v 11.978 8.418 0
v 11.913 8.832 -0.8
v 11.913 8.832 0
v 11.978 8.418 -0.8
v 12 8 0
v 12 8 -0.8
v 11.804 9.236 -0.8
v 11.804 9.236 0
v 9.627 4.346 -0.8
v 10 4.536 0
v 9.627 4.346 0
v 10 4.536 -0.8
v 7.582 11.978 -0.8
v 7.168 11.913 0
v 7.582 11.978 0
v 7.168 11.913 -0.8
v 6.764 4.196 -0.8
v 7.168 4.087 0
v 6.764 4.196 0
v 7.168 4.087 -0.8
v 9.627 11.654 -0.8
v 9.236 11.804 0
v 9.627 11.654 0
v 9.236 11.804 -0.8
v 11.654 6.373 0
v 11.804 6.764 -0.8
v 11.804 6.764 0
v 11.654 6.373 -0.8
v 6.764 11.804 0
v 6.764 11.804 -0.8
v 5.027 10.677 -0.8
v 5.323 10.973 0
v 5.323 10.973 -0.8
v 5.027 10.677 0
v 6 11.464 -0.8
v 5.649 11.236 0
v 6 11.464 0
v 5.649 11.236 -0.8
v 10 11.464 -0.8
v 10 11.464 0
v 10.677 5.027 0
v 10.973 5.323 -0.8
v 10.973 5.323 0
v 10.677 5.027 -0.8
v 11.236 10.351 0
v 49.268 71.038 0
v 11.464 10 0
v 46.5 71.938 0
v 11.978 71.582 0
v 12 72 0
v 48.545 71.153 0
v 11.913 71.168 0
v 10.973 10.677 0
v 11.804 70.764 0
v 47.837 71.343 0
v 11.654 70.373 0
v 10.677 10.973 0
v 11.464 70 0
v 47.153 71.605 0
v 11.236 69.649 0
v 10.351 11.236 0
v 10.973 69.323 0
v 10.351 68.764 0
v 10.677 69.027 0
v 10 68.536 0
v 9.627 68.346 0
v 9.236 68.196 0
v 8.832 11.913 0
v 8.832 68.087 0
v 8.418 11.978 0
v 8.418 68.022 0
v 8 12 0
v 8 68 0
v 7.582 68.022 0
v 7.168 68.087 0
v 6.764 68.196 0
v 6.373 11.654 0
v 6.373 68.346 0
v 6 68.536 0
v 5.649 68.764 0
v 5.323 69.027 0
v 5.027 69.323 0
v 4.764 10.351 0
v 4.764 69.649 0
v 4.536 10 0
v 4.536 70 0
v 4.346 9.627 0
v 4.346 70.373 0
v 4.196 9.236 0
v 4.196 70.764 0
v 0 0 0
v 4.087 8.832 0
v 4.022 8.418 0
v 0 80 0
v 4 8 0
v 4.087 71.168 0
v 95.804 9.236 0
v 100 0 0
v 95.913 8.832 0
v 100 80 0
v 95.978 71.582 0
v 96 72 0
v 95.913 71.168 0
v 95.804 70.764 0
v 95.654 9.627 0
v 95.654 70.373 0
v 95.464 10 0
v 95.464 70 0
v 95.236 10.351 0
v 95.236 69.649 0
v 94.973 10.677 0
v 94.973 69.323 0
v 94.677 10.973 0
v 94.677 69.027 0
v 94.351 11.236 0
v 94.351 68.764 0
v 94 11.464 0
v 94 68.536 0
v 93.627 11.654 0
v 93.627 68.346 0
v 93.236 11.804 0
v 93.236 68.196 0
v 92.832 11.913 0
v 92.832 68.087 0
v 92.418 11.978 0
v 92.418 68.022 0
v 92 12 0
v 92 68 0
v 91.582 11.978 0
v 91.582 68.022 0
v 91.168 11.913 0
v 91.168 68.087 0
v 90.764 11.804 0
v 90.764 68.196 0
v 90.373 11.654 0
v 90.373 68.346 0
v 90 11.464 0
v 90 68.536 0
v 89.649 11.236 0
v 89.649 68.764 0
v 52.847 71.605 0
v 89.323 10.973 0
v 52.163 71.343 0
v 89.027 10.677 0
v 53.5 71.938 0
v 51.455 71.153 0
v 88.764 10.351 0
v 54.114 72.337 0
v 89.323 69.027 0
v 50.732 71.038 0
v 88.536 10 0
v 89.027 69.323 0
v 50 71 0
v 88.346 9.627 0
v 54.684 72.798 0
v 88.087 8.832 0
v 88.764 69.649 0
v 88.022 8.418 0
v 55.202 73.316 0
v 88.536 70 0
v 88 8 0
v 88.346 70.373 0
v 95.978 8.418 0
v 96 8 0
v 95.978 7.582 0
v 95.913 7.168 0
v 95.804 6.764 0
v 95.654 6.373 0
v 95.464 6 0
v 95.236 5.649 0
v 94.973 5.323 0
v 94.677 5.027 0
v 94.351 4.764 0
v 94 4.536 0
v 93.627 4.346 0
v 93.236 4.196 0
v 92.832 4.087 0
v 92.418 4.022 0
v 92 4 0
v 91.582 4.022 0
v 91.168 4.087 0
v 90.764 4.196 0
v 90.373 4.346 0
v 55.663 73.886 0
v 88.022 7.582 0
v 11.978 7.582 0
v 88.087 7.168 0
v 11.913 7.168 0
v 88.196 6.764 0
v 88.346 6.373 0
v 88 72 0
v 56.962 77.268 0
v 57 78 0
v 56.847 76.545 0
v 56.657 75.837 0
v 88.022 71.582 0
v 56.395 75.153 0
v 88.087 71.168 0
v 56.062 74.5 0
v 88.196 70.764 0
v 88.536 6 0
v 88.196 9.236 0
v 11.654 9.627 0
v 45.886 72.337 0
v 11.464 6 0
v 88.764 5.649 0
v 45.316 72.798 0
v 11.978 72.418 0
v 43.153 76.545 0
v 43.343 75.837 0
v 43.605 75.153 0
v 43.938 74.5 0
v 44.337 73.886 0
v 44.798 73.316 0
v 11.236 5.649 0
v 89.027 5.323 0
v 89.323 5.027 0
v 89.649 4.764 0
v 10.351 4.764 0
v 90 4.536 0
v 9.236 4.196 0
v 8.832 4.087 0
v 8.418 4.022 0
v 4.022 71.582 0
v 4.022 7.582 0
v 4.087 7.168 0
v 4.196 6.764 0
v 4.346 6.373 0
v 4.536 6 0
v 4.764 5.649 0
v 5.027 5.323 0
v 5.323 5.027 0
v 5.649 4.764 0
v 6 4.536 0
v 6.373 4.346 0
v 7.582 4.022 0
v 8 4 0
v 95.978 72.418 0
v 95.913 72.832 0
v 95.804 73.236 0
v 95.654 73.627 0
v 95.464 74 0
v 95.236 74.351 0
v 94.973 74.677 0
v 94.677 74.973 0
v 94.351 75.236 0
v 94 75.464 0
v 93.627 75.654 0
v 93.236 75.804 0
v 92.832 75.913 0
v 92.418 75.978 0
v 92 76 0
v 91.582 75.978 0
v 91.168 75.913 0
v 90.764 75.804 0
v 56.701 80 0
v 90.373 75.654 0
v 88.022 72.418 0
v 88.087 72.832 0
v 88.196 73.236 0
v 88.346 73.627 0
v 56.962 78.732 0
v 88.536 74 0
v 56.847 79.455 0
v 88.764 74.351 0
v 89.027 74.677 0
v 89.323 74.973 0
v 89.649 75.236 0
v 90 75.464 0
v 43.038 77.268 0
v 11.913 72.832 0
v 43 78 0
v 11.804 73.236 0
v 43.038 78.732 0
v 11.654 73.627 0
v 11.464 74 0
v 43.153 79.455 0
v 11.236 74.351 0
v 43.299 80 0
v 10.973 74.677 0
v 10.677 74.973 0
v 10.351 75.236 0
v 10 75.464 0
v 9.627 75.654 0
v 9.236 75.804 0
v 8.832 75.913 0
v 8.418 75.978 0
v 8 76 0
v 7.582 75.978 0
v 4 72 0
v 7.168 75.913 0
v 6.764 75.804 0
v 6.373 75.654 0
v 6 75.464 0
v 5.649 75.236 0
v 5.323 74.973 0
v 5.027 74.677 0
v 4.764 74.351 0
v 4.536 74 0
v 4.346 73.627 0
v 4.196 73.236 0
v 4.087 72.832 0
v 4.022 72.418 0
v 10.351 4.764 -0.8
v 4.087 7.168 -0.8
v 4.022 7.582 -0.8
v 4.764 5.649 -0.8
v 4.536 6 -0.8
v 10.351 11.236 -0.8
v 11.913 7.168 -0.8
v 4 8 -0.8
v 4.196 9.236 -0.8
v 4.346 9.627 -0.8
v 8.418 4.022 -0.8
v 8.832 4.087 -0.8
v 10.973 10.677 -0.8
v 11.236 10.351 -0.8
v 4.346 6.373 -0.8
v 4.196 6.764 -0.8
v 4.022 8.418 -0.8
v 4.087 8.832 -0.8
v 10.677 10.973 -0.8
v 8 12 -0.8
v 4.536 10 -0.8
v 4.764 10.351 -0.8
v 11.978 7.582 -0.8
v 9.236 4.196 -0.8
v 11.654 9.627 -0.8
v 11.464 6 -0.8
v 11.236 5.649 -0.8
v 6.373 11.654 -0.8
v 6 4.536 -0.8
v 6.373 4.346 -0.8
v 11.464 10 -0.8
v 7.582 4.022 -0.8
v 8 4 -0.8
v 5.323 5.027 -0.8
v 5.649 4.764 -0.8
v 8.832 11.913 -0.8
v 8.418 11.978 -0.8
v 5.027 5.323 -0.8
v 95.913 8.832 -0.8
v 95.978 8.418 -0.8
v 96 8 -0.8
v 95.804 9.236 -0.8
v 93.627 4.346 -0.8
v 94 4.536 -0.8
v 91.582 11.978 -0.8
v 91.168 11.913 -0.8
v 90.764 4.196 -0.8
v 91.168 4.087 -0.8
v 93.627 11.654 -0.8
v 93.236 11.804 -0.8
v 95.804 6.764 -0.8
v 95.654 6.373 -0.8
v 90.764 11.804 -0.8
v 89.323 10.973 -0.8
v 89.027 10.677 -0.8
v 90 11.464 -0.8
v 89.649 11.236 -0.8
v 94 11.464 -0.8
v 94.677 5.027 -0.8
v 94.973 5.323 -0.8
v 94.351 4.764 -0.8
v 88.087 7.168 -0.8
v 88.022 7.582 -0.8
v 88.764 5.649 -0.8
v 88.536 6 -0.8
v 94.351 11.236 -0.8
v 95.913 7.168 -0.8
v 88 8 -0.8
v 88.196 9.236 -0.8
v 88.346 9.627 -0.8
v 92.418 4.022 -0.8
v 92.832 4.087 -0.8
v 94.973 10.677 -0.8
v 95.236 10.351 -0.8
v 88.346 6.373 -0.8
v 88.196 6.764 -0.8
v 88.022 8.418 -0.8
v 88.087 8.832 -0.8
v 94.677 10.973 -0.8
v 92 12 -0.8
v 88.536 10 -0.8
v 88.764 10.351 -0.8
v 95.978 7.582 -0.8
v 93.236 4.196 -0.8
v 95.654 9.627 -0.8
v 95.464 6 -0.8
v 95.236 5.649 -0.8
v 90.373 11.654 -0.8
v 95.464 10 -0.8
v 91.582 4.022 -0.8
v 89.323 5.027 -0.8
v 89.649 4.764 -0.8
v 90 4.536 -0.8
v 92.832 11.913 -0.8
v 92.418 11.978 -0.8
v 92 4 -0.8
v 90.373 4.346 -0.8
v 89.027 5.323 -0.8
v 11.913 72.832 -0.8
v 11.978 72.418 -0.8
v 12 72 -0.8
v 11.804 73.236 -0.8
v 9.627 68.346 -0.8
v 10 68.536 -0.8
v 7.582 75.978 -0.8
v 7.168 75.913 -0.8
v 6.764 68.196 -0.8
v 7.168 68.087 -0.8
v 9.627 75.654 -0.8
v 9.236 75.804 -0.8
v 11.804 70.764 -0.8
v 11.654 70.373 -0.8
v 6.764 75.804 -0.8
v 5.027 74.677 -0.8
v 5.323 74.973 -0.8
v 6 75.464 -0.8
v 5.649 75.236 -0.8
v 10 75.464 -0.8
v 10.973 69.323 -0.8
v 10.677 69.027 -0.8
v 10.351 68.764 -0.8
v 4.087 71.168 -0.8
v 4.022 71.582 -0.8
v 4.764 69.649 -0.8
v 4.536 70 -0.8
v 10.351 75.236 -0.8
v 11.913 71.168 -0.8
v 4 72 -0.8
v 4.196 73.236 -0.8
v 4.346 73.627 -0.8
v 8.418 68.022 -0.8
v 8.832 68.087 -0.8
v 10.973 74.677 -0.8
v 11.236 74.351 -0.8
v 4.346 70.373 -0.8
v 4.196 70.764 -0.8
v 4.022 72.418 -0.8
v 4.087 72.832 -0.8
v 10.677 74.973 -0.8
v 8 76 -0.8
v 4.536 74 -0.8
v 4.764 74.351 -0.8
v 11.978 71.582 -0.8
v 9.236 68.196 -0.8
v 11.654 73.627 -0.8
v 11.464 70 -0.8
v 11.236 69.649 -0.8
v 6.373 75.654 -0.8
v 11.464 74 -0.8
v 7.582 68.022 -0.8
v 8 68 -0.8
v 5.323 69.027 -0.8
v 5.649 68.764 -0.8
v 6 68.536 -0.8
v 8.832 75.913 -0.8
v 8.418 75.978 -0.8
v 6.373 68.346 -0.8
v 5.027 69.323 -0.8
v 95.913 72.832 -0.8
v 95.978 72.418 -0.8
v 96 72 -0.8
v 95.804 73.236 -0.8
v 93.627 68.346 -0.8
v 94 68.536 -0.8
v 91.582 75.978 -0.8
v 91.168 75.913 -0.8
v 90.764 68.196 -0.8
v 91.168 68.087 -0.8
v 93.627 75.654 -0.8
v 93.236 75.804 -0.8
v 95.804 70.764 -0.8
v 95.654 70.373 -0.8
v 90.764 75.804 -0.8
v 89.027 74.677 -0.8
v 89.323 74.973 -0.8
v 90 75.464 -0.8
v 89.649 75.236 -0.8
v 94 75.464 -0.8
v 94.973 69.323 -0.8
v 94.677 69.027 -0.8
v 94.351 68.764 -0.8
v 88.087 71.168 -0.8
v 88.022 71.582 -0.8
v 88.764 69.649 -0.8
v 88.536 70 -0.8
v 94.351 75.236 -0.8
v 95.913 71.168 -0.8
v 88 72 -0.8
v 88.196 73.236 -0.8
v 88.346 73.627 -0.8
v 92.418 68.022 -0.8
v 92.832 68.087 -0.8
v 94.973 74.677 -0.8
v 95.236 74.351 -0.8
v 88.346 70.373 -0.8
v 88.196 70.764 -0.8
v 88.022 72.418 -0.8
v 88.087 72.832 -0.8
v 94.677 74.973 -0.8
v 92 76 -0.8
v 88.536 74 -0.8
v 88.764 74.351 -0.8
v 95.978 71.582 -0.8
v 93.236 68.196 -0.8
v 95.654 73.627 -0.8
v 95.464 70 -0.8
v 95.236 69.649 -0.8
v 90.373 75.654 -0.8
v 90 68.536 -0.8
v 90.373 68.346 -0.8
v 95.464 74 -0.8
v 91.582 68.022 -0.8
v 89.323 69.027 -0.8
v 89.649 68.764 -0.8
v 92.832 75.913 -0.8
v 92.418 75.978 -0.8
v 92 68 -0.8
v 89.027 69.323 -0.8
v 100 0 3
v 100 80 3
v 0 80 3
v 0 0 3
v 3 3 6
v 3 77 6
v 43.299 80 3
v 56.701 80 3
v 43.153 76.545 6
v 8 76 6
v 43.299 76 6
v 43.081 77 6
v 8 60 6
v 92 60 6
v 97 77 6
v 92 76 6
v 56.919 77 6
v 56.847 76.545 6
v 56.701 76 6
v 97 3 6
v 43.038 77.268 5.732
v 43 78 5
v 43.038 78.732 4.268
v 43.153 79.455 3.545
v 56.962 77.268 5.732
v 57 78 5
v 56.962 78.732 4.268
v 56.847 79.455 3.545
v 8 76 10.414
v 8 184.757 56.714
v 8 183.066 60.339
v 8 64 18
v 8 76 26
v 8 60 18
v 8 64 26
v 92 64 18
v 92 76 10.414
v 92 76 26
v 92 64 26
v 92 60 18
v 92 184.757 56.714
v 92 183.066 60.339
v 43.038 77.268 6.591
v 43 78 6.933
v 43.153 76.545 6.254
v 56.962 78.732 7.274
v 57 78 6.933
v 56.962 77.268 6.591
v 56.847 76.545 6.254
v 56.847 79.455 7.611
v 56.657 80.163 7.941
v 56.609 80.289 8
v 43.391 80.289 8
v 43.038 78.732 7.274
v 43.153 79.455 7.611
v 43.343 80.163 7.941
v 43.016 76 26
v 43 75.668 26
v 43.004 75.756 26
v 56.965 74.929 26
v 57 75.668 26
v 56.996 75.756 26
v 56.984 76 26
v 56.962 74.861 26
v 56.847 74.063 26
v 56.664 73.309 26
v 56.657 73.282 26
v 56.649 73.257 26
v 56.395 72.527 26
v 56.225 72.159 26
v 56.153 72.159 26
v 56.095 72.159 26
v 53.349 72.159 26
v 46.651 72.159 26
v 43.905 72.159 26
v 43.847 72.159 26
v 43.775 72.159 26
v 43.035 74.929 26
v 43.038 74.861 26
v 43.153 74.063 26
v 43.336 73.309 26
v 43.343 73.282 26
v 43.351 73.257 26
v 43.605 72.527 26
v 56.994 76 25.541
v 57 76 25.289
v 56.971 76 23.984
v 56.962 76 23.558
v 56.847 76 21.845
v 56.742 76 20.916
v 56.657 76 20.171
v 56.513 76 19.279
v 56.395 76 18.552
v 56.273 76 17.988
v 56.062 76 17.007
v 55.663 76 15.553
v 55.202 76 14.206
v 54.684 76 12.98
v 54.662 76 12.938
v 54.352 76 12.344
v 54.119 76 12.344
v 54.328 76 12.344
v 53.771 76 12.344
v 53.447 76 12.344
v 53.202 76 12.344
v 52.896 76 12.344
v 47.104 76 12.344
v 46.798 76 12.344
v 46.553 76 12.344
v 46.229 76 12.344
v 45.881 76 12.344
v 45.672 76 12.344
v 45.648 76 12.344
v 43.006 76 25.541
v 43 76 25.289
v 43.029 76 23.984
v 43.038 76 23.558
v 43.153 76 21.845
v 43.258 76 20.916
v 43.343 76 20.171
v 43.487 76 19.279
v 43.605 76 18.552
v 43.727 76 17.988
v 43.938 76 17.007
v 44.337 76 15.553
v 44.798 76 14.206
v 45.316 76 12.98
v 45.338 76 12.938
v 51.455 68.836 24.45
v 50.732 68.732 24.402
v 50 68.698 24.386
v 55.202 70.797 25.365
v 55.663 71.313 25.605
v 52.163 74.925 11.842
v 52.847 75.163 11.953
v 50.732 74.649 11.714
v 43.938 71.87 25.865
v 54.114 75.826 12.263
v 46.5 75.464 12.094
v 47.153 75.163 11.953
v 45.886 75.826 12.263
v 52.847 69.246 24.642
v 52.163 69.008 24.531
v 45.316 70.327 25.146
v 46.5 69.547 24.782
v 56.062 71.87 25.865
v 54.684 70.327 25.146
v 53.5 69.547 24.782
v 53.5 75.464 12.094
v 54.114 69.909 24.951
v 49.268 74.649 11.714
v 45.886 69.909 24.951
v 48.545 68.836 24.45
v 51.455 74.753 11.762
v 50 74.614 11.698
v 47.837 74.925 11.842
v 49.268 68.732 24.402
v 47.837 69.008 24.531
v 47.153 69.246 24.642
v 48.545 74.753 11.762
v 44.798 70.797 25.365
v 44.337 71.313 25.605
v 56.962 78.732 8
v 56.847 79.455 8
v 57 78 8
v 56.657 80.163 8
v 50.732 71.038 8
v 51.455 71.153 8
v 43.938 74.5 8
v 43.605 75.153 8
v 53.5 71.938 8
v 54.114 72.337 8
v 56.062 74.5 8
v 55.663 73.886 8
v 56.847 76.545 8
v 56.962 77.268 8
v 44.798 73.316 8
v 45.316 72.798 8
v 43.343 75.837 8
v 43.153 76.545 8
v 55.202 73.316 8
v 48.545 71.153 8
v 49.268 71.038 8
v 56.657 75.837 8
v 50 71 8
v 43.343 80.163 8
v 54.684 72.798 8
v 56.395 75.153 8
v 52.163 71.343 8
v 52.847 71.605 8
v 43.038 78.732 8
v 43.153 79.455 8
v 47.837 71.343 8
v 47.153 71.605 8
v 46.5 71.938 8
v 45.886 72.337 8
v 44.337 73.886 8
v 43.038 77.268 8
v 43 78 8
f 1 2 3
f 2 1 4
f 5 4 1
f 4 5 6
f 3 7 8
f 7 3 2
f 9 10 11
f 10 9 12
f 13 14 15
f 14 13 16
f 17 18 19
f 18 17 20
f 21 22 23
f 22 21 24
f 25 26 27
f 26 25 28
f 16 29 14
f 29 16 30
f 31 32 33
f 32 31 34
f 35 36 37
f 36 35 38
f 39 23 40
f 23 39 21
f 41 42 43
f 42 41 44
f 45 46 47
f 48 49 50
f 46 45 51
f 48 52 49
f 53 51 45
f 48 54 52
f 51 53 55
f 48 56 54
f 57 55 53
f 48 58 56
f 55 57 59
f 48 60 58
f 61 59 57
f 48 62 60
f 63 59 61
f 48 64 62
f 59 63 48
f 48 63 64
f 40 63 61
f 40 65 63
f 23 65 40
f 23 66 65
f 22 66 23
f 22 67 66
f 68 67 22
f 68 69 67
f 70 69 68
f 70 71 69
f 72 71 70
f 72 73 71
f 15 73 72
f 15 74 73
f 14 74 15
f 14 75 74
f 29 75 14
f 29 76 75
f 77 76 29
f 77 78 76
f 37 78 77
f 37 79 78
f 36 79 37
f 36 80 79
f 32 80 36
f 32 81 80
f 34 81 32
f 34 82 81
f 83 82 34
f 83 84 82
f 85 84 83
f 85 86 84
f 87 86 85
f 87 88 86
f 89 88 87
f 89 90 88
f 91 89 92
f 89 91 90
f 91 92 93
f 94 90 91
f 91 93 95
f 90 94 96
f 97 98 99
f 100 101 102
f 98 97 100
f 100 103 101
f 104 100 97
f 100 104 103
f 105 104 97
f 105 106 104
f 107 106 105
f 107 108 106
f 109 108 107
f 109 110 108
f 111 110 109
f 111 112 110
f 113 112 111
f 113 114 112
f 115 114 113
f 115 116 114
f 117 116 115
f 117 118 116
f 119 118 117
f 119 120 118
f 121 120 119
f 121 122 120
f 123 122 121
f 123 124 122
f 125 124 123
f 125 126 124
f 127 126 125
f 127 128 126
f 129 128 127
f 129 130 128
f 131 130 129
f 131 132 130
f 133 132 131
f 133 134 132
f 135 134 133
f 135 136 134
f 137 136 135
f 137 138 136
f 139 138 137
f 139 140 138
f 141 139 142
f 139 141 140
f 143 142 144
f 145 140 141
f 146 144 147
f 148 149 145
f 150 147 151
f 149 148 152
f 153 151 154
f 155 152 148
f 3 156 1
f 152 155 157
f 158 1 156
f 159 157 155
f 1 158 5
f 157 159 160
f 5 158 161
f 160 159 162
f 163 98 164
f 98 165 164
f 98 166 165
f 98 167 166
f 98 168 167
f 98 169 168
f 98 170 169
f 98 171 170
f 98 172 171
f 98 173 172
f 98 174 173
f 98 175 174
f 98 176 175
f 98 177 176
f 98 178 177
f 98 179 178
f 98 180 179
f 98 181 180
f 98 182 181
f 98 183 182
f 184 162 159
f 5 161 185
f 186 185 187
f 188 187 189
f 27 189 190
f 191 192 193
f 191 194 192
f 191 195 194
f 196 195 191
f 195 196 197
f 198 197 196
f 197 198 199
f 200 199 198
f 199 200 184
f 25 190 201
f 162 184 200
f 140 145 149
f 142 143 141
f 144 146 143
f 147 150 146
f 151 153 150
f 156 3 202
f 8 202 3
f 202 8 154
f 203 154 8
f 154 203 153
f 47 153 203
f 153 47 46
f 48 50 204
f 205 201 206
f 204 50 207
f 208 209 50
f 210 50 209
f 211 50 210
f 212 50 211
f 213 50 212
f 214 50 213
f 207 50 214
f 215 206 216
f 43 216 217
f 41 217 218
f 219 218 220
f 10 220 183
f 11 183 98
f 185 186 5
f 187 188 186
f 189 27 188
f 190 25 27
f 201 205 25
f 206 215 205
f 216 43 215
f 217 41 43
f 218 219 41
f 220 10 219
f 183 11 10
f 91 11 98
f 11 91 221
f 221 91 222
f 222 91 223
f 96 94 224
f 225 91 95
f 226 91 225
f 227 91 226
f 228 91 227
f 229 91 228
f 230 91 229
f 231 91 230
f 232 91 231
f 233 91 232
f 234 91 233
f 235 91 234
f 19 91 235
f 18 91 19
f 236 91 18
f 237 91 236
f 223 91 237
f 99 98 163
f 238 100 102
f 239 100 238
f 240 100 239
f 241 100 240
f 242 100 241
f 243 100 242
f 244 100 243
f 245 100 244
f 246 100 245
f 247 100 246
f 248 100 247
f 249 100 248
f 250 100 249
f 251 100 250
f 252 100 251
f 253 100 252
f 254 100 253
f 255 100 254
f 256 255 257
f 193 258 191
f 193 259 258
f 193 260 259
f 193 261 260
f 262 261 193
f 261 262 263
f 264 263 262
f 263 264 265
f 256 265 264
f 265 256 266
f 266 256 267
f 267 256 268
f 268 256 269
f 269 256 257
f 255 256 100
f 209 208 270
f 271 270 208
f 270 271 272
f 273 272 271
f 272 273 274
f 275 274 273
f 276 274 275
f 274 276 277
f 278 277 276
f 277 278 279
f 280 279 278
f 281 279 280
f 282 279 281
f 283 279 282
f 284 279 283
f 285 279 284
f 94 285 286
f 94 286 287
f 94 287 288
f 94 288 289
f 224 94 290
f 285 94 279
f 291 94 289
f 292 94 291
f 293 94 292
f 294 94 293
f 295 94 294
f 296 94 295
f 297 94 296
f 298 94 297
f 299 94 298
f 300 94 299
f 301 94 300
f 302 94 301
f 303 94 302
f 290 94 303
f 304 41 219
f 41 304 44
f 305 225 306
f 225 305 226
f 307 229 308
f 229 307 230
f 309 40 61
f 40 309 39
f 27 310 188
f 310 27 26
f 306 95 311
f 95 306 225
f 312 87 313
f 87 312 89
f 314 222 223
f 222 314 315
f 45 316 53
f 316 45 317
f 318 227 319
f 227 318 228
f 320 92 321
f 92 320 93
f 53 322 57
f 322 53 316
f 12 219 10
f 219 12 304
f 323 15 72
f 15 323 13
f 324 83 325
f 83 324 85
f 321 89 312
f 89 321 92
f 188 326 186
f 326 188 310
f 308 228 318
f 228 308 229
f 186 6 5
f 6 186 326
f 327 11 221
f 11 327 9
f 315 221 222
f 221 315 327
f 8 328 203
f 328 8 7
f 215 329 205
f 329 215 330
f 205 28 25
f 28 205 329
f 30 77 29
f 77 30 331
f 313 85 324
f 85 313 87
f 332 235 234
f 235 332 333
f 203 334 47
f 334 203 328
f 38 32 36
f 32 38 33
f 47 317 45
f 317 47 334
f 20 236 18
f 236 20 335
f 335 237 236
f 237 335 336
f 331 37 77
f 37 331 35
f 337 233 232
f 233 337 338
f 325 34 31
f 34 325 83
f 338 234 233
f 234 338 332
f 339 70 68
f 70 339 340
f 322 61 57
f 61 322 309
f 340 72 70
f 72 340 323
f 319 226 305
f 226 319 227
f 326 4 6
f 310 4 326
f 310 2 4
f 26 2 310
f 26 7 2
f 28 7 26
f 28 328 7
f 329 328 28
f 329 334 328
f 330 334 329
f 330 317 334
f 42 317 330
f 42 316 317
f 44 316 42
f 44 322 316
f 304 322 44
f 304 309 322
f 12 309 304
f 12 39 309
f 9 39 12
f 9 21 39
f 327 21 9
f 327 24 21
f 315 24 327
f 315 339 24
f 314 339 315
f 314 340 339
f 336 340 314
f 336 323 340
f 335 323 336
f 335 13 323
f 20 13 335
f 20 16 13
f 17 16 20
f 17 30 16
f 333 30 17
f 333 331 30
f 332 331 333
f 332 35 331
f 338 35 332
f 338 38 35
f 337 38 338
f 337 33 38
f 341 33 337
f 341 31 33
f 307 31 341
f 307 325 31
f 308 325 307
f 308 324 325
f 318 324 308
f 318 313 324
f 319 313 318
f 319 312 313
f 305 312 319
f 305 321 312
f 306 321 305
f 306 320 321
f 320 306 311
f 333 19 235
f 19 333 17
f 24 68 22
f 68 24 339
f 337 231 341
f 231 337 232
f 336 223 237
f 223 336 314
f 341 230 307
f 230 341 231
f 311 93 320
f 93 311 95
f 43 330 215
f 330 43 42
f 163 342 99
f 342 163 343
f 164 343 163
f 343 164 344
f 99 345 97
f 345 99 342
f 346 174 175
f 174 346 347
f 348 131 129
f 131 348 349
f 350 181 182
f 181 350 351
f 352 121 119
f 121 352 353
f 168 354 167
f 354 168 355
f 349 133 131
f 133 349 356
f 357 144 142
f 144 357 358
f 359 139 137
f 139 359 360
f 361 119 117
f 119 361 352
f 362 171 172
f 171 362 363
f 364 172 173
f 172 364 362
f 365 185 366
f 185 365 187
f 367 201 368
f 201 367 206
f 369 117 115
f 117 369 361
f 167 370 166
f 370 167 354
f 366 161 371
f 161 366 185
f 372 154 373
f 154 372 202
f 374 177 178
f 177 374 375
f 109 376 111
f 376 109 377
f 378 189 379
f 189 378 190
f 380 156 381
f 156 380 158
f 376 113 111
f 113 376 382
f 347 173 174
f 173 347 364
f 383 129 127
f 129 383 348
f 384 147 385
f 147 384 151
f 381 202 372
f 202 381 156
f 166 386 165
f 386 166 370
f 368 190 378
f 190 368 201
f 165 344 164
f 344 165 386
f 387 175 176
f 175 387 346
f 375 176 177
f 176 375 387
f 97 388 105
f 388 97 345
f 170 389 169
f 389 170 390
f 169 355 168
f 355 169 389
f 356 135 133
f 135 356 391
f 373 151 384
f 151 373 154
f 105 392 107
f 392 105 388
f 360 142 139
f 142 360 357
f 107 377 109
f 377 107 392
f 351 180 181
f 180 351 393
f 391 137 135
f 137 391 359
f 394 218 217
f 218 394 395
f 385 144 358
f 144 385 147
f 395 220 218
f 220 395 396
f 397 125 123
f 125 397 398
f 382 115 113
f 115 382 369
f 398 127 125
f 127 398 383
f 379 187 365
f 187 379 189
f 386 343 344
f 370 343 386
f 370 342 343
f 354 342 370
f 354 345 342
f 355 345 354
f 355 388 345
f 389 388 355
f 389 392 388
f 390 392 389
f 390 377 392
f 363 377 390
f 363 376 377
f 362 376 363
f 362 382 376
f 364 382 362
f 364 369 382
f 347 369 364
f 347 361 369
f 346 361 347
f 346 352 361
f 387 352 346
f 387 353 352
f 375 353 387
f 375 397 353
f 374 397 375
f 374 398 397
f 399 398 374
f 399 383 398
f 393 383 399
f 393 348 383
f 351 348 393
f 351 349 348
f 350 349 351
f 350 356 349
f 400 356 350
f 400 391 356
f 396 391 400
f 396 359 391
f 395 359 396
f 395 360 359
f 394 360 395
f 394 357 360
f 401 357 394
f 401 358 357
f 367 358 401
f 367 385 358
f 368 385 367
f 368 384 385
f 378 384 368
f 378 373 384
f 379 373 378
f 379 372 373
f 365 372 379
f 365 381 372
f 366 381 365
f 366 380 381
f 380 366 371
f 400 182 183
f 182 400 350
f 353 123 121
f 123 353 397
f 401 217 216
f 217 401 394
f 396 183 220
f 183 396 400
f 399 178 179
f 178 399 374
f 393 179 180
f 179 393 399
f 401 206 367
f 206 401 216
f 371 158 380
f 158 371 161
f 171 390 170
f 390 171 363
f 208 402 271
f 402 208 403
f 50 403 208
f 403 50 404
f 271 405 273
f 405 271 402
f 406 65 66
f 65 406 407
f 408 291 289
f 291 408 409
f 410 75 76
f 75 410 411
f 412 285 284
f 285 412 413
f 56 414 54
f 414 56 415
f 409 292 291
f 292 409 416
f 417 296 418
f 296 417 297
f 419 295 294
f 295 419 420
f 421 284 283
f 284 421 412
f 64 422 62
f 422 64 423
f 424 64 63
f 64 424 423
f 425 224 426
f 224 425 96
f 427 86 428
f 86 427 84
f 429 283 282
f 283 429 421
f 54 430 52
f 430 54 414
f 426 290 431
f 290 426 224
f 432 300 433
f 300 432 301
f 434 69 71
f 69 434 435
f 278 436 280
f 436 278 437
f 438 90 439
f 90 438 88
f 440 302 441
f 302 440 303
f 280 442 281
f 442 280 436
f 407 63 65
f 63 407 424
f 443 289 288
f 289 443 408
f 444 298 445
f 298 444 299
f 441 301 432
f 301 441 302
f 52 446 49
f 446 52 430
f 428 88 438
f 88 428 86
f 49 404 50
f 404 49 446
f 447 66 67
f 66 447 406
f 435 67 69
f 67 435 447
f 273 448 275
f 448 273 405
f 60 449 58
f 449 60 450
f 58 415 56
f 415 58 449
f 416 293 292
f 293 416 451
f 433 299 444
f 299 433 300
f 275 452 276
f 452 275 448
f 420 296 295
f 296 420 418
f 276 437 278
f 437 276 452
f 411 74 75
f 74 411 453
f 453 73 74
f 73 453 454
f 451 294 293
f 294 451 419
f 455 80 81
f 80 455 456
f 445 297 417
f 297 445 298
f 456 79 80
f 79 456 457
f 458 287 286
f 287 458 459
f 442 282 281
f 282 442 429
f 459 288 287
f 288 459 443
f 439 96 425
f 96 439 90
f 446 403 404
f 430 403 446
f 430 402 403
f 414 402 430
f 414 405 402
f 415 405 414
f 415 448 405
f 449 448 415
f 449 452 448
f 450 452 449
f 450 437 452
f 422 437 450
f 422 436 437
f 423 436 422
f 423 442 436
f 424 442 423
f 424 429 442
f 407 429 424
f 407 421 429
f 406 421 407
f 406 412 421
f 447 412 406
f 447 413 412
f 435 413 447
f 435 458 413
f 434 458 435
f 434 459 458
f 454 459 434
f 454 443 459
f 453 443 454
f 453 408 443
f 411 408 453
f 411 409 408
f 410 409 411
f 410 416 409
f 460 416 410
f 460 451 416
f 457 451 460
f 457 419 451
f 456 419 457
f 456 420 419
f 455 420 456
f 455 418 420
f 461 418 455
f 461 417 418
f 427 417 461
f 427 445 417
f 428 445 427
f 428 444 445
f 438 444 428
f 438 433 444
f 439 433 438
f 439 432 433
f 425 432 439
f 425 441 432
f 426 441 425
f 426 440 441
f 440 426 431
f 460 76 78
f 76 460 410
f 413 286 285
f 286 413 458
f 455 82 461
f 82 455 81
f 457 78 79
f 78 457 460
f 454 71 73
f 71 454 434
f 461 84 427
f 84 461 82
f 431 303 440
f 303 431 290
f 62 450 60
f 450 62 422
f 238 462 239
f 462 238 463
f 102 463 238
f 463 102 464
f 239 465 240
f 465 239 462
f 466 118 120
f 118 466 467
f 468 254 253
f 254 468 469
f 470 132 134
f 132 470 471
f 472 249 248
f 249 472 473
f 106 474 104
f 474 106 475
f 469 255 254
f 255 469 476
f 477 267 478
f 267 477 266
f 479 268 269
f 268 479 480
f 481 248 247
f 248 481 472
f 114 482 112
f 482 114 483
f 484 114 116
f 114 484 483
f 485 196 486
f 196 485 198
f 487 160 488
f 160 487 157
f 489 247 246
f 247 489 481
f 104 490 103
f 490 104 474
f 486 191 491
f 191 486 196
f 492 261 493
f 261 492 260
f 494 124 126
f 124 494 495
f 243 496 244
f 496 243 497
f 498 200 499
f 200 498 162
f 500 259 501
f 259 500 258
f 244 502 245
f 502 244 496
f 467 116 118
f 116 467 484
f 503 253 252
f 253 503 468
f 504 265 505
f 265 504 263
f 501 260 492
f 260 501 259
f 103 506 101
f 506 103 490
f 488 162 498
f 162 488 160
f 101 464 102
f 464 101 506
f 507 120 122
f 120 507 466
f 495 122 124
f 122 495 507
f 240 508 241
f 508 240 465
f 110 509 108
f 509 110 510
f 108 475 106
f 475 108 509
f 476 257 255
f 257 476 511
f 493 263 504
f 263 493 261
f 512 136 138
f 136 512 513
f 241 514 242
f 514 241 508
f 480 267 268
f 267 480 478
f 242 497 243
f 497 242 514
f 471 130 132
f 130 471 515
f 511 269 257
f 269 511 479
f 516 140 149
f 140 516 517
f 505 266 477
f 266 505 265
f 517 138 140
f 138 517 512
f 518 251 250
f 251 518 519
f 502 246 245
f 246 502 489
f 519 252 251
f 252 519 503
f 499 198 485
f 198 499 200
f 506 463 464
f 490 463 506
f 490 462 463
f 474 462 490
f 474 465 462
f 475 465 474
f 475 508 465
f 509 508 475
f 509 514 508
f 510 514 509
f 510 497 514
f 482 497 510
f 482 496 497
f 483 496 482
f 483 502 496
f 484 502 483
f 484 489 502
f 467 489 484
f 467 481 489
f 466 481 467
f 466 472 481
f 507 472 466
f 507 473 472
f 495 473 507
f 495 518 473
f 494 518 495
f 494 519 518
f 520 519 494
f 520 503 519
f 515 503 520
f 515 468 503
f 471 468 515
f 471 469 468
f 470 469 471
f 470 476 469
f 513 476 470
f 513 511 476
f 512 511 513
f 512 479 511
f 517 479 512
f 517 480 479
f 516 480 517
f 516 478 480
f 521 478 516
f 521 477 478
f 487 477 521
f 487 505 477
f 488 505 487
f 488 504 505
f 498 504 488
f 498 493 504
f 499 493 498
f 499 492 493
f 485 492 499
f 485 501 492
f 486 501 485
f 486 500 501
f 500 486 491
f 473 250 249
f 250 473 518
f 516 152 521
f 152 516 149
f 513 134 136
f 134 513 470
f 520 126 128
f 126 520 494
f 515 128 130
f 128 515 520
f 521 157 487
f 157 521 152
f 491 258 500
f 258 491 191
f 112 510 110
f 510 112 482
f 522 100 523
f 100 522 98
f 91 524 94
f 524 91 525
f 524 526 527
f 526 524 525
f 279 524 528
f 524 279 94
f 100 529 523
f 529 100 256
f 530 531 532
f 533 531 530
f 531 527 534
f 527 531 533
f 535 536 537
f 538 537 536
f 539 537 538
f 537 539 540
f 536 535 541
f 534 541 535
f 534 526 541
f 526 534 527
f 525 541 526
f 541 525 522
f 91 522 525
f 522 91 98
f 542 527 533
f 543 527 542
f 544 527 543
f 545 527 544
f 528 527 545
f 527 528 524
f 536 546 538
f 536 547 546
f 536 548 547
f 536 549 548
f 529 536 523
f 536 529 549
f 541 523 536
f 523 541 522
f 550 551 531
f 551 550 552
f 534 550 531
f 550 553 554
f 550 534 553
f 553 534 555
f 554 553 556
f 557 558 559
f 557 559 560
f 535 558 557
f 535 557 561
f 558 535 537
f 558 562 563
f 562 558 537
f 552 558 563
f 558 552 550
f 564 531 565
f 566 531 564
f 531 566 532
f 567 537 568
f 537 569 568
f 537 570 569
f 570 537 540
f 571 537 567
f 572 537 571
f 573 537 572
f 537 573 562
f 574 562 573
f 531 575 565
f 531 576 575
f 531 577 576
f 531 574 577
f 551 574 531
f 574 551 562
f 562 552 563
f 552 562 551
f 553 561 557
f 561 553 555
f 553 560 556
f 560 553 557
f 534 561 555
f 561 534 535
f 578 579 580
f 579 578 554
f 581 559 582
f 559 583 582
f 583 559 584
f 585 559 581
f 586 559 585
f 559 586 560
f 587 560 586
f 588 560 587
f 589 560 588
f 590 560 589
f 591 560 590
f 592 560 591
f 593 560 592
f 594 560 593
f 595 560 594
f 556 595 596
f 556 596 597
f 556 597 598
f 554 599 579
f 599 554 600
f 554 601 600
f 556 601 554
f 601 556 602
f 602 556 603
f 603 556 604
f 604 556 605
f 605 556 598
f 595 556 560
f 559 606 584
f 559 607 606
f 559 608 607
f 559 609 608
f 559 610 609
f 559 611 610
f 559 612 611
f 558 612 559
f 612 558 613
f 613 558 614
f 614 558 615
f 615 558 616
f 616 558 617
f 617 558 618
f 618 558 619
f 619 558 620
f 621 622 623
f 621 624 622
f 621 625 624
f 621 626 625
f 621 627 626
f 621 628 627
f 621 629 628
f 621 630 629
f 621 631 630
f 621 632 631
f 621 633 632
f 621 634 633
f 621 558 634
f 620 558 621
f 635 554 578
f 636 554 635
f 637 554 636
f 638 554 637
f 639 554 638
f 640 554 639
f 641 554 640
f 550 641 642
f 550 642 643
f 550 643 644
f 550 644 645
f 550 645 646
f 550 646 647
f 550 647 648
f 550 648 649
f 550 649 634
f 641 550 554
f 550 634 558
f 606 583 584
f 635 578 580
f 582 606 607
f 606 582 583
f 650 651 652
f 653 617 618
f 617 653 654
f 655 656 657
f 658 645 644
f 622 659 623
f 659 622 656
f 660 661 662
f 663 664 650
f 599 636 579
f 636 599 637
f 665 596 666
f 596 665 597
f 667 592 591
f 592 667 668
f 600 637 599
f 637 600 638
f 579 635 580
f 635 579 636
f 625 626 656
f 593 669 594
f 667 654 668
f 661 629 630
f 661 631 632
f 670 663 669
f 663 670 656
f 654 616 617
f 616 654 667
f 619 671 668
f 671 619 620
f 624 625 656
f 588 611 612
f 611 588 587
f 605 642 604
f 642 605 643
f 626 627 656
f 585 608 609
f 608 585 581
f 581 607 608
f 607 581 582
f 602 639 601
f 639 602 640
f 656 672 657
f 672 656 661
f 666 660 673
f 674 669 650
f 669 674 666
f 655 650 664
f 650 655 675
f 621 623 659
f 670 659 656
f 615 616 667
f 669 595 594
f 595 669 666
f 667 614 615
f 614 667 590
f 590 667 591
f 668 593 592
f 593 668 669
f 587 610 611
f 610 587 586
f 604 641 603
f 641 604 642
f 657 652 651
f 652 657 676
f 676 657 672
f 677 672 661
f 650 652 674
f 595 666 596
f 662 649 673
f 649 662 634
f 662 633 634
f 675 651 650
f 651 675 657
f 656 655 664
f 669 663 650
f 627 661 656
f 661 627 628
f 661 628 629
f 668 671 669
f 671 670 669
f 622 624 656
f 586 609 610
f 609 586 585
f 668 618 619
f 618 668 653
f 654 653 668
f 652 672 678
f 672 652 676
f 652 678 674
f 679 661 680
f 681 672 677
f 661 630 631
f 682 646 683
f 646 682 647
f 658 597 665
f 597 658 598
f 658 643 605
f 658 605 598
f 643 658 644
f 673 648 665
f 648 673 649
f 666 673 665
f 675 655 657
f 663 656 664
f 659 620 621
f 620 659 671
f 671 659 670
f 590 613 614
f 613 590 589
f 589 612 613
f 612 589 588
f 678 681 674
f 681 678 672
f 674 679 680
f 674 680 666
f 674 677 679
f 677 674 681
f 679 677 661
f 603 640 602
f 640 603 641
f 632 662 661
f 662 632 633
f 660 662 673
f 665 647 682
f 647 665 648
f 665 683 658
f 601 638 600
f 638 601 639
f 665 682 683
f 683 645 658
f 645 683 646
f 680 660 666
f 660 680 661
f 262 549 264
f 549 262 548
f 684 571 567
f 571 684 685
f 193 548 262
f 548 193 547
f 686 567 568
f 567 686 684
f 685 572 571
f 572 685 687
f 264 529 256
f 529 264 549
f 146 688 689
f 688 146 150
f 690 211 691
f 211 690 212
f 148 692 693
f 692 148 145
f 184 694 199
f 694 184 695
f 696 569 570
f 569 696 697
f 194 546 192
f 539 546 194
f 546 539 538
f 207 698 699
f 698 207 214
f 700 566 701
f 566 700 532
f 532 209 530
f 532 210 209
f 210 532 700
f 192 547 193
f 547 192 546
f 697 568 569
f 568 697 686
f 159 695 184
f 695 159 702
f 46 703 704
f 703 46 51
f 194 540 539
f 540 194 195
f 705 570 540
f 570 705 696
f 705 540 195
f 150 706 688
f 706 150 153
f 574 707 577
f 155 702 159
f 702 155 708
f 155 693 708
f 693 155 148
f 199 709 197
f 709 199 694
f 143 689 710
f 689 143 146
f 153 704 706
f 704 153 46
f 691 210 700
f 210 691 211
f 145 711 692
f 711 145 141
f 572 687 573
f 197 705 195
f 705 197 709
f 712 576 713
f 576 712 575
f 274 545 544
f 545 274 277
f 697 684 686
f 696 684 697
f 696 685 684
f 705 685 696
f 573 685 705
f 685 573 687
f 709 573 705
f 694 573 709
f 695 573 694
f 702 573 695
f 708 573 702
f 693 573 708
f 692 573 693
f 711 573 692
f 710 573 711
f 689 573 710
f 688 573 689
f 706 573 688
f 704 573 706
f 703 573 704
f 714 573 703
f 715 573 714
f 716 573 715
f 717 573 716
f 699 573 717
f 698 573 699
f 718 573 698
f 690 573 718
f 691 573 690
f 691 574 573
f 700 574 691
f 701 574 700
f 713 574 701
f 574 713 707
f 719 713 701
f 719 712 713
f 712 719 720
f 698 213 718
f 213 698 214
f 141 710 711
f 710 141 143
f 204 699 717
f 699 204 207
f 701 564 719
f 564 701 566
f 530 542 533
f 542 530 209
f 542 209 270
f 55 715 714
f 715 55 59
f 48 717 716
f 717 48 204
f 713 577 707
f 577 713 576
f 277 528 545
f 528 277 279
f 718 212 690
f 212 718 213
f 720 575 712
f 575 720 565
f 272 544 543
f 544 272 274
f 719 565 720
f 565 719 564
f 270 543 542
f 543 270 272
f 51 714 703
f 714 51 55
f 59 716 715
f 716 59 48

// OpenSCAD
// =============================================================================
// Parametric Phone Stand
// =============================================================================
// Description : An adjustable-angle phone stand with cable pass-through,
//               configurable phone slot, and a stable weighted base.
// Author      : 3D LLM Generator
// License     : MIT
//
// Print Settings (FDM):
//   Layer Height : 0.2 mm
//   Infill       : 30-40% (higher for base stability)
//   Supports     : May be needed for cable hole overhang
//   Material     : PLA or PETG
//   Nozzle       : 0.4 mm
//   Orientation  : Print upright as-is
// =============================================================================

// ─── Parameters ──────────────────────────────────────────────────────────────

// Phone dimensions (slot sizing)
phone_width     = 80;   // [60:100]  Width of phone (X), slot will be slightly wider
phone_thickness = 12;   // [8:20]    Thickness of phone with case
slot_depth      = 20;   // [10:40]   How deep the phone sits in the slot

// Stand geometry
viewing_angle   = 65;   // [30:85]   Angle from horizontal (degrees)
back_height     = 120;  // [80:200]  Height of the back support panel
back_thickness  = 4;    // [3:8]     Thickness of the back support panel

// Base dimensions
base_width      = 100;  // [80:160]  Width of the base
base_depth      = 80;   // [50:120]  Depth of the base (front to back)
base_height     = 6;    // [4:12]    Thickness / height of the base

// Cable pass-through
cable_hole_diameter = 14;  // [0:25] Set to 0 to disable cable hole
cable_hole_offset_z = 15;  // [10:30] Height of hole center above base

// Lip / front ledge that prevents the phone from sliding off
lip_height    = 12;   // [8:25]  Height of the front lip
lip_thickness = 4;    // [3:8]   Thickness of the front lip

// Aesthetics
fillet_radius = 3;    // [0:8]   Fillet on base edges (visual only, approximated)

// Resolution
$fn = 60;

// ─── Derived Values ──────────────────────────────────────────────────────────

slot_width = phone_width + 4;  // 2 mm clearance on each side

// The back panel leans at the viewing_angle; we calculate the base offset
// so the panel bottom sits at the rear of the base.
panel_base_y = base_depth - back_thickness;

// ─── Modules ─────────────────────────────────────────────────────────────────

// Stable weighted base — a wide, flat slab
module base() {
    // Main base plate with slight chamfer via hull of two rects
    hull() {
        // Bottom plate — full size
        translate([0, 0, 0])
            cube([base_width, base_depth, base_height - fillet_radius]);

        // Top of base — slightly inset for a subtle chamfer
        translate([fillet_radius, fillet_radius, base_height - fillet_radius])
            cube([
                base_width - 2 * fillet_radius,
                base_depth - 2 * fillet_radius,
                fillet_radius
            ]);
    }
}

// The angled back panel that supports the phone
module back_panel() {
    translate([
        (base_width - slot_width) / 2,
        panel_base_y,
        base_height
    ])
    rotate([90 - viewing_angle, 0, 0])
        cube([slot_width, back_height, back_thickness]);
}

// Front lip / ledge that catches the bottom of the phone
module front_lip() {
    lip_y_start = panel_base_y - phone_thickness - lip_thickness;

    translate([
        (base_width - slot_width) / 2,
        lip_y_start,
        base_height
    ])
        cube([slot_width, lip_thickness, lip_height]);
}

// Phone slot: the recessed channel where the phone's bottom edge sits
module phone_slot() {
    slot_y = panel_base_y - phone_thickness;

    translate([
        (base_width - slot_width) / 2,
        slot_y,
        base_height
    ])
        cube([slot_width, phone_thickness, slot_depth]);
}

// Cable pass-through hole in the back panel and base
module cable_hole() {
    if (cable_hole_diameter > 0) {
        hole_x = base_width / 2;
        hole_y = panel_base_y + back_thickness / 2;
        hole_z = base_height + cable_hole_offset_z;

        // Hole through the base/panel junction area
        translate([hole_x, hole_y, hole_z])
            rotate([90 - viewing_angle, 0, 0])
                cylinder(
                    d = cable_hole_diameter,
                    h = back_thickness + 10,
                    center = true
                );

        // Secondary vertical hole through the base for cable routing
        translate([hole_x, hole_y, 0])
            cylinder(d = cable_hole_diameter, h = base_height + 2);
    }
}

// Anti-slip pads (small cylinders on the bottom for grip)
module anti_slip_pads() {
    pad_r      = 4;
    pad_h      = 0.8;
    pad_inset  = 8;

    positions = [
        [pad_inset,              pad_inset,              -pad_h],
        [base_width - pad_inset, pad_inset,              -pad_h],
        [pad_inset,              base_depth - pad_inset,  -pad_h],
        [base_width - pad_inset, base_depth - pad_inset,  -pad_h],
    ];

    for (pos = positions) {
        translate(pos)
            cylinder(r = pad_r, h = pad_h);
    }
}

// ─── Assembly ────────────────────────────────────────────────────────────────

module phone_stand() {
    difference() {
        union() {
            base();
            back_panel();
            front_lip();
            phone_slot();
            anti_slip_pads();
        }

        // Subtract the cable hole from the whole assembly
        cable_hole();
    }
}

// ─── Render ──────────────────────────────────────────────────────────────────

color("SlateGray")
    phone_stand();
